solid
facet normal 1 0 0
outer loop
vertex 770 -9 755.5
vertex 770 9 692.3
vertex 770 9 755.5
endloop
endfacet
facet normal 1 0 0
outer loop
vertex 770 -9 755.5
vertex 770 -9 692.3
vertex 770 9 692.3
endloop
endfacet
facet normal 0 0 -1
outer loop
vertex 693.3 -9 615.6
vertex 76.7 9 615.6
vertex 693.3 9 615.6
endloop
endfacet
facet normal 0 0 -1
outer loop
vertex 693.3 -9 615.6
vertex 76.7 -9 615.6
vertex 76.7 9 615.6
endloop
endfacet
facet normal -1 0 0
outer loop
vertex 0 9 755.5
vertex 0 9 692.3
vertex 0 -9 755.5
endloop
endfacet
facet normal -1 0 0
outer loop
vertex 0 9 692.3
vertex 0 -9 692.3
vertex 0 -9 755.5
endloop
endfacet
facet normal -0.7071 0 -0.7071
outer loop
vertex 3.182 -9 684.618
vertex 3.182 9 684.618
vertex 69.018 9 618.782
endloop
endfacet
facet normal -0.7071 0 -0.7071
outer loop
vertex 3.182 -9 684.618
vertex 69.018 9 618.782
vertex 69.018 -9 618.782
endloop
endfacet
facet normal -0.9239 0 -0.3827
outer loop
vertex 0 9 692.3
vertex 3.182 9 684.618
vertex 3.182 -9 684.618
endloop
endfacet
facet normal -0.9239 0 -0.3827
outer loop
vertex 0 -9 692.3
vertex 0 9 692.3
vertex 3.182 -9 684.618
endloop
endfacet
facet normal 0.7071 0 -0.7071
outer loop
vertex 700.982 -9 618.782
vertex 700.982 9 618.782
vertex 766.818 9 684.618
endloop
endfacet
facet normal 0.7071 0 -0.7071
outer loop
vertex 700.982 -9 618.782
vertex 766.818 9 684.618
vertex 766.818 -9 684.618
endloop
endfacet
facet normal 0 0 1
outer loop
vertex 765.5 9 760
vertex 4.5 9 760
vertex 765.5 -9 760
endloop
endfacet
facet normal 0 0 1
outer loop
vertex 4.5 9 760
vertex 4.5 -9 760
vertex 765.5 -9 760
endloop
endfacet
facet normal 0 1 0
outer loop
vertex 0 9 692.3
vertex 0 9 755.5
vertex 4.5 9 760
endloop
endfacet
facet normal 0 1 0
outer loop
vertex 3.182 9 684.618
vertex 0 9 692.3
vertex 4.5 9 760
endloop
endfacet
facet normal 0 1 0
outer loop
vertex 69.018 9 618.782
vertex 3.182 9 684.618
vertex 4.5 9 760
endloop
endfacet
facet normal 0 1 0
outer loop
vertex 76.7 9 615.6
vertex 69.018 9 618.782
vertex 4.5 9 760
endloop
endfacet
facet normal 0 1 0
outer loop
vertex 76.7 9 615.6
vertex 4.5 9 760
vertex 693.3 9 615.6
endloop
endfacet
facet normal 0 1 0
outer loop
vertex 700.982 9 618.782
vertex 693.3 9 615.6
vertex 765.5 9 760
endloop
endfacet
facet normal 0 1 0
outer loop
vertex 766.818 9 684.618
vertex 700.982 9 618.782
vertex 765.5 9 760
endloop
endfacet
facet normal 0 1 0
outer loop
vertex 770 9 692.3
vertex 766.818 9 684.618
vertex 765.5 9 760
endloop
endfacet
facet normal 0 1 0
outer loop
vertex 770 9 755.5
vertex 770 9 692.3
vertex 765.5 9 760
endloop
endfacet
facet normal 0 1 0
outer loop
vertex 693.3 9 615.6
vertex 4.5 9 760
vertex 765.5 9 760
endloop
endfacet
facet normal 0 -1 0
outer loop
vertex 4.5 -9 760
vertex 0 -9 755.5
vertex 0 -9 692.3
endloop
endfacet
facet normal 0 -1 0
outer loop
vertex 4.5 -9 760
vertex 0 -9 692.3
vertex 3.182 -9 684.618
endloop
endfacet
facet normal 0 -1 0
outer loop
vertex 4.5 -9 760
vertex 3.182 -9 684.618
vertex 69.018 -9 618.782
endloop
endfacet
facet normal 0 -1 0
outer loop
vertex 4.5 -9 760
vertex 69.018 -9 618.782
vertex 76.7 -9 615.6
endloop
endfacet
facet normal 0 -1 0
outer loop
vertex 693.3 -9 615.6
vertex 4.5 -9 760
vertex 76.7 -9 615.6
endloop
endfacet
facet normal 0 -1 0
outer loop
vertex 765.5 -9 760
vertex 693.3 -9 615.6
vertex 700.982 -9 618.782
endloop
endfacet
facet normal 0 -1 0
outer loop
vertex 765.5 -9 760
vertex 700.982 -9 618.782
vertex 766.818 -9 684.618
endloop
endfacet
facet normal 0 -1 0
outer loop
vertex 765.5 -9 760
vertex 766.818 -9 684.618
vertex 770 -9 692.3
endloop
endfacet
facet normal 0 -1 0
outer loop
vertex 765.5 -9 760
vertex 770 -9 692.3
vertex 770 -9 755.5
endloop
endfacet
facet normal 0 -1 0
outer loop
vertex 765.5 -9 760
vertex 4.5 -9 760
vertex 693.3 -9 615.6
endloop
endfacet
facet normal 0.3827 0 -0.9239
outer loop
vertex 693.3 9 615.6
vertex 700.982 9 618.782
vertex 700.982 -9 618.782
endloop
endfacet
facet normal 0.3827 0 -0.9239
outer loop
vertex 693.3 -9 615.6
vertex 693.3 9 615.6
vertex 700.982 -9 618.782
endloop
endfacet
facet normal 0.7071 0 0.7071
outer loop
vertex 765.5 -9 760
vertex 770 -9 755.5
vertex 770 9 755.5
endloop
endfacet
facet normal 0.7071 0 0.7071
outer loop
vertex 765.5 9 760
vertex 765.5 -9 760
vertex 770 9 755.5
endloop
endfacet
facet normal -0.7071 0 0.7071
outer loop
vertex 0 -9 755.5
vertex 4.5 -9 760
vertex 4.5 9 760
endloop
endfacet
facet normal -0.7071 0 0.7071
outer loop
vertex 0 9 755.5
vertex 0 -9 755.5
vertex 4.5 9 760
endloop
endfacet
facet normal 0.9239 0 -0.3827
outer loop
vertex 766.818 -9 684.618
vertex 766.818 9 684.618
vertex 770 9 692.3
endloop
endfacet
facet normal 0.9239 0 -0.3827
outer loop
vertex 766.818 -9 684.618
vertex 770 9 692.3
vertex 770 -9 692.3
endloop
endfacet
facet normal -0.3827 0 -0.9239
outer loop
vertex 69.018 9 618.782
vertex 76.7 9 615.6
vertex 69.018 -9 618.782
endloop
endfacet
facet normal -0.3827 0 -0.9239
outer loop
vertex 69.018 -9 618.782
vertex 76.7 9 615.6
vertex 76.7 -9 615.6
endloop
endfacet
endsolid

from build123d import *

# Parameters (mm, degrees)
SKETCH_W        = 770
SKETCH_H        = 144.4
PAD_DEPTH       = 9
CHAMFER_SIZE    = 72.2
CHAMFER001_SIZE = 4.5


with BuildPart() as part:
    # Sketch → Pad (new body, symmetric)
    with BuildSketch(Plane.XZ):
        with Locations((385, 687.8)):
            Rectangle(SKETCH_W, SKETCH_H)
    extrude(amount=PAD_DEPTH, both=True)

    # Chamfer
    chamfer_edges = [part.edges().sort_by_distance(p)[0] for p in [
        (770, 0, 615.6),
        (0, 0, 615.6),
    ]]
    chamfer(chamfer_edges, length=CHAMFER_SIZE)

    # Chamfer001
    chamfer001_edges = [part.edges().sort_by_distance(p)[0] for p in [
        (0, 0, 687.8),
        (0, 0, 760),
        (72.2, 0, 615.6),
        (697.8, 0, 615.6),
        (770, 0, 687.8),
        (770, 0, 760),
    ]]
    chamfer(chamfer001_edges, length=CHAMFER001_SIZE)


solid = part.part
